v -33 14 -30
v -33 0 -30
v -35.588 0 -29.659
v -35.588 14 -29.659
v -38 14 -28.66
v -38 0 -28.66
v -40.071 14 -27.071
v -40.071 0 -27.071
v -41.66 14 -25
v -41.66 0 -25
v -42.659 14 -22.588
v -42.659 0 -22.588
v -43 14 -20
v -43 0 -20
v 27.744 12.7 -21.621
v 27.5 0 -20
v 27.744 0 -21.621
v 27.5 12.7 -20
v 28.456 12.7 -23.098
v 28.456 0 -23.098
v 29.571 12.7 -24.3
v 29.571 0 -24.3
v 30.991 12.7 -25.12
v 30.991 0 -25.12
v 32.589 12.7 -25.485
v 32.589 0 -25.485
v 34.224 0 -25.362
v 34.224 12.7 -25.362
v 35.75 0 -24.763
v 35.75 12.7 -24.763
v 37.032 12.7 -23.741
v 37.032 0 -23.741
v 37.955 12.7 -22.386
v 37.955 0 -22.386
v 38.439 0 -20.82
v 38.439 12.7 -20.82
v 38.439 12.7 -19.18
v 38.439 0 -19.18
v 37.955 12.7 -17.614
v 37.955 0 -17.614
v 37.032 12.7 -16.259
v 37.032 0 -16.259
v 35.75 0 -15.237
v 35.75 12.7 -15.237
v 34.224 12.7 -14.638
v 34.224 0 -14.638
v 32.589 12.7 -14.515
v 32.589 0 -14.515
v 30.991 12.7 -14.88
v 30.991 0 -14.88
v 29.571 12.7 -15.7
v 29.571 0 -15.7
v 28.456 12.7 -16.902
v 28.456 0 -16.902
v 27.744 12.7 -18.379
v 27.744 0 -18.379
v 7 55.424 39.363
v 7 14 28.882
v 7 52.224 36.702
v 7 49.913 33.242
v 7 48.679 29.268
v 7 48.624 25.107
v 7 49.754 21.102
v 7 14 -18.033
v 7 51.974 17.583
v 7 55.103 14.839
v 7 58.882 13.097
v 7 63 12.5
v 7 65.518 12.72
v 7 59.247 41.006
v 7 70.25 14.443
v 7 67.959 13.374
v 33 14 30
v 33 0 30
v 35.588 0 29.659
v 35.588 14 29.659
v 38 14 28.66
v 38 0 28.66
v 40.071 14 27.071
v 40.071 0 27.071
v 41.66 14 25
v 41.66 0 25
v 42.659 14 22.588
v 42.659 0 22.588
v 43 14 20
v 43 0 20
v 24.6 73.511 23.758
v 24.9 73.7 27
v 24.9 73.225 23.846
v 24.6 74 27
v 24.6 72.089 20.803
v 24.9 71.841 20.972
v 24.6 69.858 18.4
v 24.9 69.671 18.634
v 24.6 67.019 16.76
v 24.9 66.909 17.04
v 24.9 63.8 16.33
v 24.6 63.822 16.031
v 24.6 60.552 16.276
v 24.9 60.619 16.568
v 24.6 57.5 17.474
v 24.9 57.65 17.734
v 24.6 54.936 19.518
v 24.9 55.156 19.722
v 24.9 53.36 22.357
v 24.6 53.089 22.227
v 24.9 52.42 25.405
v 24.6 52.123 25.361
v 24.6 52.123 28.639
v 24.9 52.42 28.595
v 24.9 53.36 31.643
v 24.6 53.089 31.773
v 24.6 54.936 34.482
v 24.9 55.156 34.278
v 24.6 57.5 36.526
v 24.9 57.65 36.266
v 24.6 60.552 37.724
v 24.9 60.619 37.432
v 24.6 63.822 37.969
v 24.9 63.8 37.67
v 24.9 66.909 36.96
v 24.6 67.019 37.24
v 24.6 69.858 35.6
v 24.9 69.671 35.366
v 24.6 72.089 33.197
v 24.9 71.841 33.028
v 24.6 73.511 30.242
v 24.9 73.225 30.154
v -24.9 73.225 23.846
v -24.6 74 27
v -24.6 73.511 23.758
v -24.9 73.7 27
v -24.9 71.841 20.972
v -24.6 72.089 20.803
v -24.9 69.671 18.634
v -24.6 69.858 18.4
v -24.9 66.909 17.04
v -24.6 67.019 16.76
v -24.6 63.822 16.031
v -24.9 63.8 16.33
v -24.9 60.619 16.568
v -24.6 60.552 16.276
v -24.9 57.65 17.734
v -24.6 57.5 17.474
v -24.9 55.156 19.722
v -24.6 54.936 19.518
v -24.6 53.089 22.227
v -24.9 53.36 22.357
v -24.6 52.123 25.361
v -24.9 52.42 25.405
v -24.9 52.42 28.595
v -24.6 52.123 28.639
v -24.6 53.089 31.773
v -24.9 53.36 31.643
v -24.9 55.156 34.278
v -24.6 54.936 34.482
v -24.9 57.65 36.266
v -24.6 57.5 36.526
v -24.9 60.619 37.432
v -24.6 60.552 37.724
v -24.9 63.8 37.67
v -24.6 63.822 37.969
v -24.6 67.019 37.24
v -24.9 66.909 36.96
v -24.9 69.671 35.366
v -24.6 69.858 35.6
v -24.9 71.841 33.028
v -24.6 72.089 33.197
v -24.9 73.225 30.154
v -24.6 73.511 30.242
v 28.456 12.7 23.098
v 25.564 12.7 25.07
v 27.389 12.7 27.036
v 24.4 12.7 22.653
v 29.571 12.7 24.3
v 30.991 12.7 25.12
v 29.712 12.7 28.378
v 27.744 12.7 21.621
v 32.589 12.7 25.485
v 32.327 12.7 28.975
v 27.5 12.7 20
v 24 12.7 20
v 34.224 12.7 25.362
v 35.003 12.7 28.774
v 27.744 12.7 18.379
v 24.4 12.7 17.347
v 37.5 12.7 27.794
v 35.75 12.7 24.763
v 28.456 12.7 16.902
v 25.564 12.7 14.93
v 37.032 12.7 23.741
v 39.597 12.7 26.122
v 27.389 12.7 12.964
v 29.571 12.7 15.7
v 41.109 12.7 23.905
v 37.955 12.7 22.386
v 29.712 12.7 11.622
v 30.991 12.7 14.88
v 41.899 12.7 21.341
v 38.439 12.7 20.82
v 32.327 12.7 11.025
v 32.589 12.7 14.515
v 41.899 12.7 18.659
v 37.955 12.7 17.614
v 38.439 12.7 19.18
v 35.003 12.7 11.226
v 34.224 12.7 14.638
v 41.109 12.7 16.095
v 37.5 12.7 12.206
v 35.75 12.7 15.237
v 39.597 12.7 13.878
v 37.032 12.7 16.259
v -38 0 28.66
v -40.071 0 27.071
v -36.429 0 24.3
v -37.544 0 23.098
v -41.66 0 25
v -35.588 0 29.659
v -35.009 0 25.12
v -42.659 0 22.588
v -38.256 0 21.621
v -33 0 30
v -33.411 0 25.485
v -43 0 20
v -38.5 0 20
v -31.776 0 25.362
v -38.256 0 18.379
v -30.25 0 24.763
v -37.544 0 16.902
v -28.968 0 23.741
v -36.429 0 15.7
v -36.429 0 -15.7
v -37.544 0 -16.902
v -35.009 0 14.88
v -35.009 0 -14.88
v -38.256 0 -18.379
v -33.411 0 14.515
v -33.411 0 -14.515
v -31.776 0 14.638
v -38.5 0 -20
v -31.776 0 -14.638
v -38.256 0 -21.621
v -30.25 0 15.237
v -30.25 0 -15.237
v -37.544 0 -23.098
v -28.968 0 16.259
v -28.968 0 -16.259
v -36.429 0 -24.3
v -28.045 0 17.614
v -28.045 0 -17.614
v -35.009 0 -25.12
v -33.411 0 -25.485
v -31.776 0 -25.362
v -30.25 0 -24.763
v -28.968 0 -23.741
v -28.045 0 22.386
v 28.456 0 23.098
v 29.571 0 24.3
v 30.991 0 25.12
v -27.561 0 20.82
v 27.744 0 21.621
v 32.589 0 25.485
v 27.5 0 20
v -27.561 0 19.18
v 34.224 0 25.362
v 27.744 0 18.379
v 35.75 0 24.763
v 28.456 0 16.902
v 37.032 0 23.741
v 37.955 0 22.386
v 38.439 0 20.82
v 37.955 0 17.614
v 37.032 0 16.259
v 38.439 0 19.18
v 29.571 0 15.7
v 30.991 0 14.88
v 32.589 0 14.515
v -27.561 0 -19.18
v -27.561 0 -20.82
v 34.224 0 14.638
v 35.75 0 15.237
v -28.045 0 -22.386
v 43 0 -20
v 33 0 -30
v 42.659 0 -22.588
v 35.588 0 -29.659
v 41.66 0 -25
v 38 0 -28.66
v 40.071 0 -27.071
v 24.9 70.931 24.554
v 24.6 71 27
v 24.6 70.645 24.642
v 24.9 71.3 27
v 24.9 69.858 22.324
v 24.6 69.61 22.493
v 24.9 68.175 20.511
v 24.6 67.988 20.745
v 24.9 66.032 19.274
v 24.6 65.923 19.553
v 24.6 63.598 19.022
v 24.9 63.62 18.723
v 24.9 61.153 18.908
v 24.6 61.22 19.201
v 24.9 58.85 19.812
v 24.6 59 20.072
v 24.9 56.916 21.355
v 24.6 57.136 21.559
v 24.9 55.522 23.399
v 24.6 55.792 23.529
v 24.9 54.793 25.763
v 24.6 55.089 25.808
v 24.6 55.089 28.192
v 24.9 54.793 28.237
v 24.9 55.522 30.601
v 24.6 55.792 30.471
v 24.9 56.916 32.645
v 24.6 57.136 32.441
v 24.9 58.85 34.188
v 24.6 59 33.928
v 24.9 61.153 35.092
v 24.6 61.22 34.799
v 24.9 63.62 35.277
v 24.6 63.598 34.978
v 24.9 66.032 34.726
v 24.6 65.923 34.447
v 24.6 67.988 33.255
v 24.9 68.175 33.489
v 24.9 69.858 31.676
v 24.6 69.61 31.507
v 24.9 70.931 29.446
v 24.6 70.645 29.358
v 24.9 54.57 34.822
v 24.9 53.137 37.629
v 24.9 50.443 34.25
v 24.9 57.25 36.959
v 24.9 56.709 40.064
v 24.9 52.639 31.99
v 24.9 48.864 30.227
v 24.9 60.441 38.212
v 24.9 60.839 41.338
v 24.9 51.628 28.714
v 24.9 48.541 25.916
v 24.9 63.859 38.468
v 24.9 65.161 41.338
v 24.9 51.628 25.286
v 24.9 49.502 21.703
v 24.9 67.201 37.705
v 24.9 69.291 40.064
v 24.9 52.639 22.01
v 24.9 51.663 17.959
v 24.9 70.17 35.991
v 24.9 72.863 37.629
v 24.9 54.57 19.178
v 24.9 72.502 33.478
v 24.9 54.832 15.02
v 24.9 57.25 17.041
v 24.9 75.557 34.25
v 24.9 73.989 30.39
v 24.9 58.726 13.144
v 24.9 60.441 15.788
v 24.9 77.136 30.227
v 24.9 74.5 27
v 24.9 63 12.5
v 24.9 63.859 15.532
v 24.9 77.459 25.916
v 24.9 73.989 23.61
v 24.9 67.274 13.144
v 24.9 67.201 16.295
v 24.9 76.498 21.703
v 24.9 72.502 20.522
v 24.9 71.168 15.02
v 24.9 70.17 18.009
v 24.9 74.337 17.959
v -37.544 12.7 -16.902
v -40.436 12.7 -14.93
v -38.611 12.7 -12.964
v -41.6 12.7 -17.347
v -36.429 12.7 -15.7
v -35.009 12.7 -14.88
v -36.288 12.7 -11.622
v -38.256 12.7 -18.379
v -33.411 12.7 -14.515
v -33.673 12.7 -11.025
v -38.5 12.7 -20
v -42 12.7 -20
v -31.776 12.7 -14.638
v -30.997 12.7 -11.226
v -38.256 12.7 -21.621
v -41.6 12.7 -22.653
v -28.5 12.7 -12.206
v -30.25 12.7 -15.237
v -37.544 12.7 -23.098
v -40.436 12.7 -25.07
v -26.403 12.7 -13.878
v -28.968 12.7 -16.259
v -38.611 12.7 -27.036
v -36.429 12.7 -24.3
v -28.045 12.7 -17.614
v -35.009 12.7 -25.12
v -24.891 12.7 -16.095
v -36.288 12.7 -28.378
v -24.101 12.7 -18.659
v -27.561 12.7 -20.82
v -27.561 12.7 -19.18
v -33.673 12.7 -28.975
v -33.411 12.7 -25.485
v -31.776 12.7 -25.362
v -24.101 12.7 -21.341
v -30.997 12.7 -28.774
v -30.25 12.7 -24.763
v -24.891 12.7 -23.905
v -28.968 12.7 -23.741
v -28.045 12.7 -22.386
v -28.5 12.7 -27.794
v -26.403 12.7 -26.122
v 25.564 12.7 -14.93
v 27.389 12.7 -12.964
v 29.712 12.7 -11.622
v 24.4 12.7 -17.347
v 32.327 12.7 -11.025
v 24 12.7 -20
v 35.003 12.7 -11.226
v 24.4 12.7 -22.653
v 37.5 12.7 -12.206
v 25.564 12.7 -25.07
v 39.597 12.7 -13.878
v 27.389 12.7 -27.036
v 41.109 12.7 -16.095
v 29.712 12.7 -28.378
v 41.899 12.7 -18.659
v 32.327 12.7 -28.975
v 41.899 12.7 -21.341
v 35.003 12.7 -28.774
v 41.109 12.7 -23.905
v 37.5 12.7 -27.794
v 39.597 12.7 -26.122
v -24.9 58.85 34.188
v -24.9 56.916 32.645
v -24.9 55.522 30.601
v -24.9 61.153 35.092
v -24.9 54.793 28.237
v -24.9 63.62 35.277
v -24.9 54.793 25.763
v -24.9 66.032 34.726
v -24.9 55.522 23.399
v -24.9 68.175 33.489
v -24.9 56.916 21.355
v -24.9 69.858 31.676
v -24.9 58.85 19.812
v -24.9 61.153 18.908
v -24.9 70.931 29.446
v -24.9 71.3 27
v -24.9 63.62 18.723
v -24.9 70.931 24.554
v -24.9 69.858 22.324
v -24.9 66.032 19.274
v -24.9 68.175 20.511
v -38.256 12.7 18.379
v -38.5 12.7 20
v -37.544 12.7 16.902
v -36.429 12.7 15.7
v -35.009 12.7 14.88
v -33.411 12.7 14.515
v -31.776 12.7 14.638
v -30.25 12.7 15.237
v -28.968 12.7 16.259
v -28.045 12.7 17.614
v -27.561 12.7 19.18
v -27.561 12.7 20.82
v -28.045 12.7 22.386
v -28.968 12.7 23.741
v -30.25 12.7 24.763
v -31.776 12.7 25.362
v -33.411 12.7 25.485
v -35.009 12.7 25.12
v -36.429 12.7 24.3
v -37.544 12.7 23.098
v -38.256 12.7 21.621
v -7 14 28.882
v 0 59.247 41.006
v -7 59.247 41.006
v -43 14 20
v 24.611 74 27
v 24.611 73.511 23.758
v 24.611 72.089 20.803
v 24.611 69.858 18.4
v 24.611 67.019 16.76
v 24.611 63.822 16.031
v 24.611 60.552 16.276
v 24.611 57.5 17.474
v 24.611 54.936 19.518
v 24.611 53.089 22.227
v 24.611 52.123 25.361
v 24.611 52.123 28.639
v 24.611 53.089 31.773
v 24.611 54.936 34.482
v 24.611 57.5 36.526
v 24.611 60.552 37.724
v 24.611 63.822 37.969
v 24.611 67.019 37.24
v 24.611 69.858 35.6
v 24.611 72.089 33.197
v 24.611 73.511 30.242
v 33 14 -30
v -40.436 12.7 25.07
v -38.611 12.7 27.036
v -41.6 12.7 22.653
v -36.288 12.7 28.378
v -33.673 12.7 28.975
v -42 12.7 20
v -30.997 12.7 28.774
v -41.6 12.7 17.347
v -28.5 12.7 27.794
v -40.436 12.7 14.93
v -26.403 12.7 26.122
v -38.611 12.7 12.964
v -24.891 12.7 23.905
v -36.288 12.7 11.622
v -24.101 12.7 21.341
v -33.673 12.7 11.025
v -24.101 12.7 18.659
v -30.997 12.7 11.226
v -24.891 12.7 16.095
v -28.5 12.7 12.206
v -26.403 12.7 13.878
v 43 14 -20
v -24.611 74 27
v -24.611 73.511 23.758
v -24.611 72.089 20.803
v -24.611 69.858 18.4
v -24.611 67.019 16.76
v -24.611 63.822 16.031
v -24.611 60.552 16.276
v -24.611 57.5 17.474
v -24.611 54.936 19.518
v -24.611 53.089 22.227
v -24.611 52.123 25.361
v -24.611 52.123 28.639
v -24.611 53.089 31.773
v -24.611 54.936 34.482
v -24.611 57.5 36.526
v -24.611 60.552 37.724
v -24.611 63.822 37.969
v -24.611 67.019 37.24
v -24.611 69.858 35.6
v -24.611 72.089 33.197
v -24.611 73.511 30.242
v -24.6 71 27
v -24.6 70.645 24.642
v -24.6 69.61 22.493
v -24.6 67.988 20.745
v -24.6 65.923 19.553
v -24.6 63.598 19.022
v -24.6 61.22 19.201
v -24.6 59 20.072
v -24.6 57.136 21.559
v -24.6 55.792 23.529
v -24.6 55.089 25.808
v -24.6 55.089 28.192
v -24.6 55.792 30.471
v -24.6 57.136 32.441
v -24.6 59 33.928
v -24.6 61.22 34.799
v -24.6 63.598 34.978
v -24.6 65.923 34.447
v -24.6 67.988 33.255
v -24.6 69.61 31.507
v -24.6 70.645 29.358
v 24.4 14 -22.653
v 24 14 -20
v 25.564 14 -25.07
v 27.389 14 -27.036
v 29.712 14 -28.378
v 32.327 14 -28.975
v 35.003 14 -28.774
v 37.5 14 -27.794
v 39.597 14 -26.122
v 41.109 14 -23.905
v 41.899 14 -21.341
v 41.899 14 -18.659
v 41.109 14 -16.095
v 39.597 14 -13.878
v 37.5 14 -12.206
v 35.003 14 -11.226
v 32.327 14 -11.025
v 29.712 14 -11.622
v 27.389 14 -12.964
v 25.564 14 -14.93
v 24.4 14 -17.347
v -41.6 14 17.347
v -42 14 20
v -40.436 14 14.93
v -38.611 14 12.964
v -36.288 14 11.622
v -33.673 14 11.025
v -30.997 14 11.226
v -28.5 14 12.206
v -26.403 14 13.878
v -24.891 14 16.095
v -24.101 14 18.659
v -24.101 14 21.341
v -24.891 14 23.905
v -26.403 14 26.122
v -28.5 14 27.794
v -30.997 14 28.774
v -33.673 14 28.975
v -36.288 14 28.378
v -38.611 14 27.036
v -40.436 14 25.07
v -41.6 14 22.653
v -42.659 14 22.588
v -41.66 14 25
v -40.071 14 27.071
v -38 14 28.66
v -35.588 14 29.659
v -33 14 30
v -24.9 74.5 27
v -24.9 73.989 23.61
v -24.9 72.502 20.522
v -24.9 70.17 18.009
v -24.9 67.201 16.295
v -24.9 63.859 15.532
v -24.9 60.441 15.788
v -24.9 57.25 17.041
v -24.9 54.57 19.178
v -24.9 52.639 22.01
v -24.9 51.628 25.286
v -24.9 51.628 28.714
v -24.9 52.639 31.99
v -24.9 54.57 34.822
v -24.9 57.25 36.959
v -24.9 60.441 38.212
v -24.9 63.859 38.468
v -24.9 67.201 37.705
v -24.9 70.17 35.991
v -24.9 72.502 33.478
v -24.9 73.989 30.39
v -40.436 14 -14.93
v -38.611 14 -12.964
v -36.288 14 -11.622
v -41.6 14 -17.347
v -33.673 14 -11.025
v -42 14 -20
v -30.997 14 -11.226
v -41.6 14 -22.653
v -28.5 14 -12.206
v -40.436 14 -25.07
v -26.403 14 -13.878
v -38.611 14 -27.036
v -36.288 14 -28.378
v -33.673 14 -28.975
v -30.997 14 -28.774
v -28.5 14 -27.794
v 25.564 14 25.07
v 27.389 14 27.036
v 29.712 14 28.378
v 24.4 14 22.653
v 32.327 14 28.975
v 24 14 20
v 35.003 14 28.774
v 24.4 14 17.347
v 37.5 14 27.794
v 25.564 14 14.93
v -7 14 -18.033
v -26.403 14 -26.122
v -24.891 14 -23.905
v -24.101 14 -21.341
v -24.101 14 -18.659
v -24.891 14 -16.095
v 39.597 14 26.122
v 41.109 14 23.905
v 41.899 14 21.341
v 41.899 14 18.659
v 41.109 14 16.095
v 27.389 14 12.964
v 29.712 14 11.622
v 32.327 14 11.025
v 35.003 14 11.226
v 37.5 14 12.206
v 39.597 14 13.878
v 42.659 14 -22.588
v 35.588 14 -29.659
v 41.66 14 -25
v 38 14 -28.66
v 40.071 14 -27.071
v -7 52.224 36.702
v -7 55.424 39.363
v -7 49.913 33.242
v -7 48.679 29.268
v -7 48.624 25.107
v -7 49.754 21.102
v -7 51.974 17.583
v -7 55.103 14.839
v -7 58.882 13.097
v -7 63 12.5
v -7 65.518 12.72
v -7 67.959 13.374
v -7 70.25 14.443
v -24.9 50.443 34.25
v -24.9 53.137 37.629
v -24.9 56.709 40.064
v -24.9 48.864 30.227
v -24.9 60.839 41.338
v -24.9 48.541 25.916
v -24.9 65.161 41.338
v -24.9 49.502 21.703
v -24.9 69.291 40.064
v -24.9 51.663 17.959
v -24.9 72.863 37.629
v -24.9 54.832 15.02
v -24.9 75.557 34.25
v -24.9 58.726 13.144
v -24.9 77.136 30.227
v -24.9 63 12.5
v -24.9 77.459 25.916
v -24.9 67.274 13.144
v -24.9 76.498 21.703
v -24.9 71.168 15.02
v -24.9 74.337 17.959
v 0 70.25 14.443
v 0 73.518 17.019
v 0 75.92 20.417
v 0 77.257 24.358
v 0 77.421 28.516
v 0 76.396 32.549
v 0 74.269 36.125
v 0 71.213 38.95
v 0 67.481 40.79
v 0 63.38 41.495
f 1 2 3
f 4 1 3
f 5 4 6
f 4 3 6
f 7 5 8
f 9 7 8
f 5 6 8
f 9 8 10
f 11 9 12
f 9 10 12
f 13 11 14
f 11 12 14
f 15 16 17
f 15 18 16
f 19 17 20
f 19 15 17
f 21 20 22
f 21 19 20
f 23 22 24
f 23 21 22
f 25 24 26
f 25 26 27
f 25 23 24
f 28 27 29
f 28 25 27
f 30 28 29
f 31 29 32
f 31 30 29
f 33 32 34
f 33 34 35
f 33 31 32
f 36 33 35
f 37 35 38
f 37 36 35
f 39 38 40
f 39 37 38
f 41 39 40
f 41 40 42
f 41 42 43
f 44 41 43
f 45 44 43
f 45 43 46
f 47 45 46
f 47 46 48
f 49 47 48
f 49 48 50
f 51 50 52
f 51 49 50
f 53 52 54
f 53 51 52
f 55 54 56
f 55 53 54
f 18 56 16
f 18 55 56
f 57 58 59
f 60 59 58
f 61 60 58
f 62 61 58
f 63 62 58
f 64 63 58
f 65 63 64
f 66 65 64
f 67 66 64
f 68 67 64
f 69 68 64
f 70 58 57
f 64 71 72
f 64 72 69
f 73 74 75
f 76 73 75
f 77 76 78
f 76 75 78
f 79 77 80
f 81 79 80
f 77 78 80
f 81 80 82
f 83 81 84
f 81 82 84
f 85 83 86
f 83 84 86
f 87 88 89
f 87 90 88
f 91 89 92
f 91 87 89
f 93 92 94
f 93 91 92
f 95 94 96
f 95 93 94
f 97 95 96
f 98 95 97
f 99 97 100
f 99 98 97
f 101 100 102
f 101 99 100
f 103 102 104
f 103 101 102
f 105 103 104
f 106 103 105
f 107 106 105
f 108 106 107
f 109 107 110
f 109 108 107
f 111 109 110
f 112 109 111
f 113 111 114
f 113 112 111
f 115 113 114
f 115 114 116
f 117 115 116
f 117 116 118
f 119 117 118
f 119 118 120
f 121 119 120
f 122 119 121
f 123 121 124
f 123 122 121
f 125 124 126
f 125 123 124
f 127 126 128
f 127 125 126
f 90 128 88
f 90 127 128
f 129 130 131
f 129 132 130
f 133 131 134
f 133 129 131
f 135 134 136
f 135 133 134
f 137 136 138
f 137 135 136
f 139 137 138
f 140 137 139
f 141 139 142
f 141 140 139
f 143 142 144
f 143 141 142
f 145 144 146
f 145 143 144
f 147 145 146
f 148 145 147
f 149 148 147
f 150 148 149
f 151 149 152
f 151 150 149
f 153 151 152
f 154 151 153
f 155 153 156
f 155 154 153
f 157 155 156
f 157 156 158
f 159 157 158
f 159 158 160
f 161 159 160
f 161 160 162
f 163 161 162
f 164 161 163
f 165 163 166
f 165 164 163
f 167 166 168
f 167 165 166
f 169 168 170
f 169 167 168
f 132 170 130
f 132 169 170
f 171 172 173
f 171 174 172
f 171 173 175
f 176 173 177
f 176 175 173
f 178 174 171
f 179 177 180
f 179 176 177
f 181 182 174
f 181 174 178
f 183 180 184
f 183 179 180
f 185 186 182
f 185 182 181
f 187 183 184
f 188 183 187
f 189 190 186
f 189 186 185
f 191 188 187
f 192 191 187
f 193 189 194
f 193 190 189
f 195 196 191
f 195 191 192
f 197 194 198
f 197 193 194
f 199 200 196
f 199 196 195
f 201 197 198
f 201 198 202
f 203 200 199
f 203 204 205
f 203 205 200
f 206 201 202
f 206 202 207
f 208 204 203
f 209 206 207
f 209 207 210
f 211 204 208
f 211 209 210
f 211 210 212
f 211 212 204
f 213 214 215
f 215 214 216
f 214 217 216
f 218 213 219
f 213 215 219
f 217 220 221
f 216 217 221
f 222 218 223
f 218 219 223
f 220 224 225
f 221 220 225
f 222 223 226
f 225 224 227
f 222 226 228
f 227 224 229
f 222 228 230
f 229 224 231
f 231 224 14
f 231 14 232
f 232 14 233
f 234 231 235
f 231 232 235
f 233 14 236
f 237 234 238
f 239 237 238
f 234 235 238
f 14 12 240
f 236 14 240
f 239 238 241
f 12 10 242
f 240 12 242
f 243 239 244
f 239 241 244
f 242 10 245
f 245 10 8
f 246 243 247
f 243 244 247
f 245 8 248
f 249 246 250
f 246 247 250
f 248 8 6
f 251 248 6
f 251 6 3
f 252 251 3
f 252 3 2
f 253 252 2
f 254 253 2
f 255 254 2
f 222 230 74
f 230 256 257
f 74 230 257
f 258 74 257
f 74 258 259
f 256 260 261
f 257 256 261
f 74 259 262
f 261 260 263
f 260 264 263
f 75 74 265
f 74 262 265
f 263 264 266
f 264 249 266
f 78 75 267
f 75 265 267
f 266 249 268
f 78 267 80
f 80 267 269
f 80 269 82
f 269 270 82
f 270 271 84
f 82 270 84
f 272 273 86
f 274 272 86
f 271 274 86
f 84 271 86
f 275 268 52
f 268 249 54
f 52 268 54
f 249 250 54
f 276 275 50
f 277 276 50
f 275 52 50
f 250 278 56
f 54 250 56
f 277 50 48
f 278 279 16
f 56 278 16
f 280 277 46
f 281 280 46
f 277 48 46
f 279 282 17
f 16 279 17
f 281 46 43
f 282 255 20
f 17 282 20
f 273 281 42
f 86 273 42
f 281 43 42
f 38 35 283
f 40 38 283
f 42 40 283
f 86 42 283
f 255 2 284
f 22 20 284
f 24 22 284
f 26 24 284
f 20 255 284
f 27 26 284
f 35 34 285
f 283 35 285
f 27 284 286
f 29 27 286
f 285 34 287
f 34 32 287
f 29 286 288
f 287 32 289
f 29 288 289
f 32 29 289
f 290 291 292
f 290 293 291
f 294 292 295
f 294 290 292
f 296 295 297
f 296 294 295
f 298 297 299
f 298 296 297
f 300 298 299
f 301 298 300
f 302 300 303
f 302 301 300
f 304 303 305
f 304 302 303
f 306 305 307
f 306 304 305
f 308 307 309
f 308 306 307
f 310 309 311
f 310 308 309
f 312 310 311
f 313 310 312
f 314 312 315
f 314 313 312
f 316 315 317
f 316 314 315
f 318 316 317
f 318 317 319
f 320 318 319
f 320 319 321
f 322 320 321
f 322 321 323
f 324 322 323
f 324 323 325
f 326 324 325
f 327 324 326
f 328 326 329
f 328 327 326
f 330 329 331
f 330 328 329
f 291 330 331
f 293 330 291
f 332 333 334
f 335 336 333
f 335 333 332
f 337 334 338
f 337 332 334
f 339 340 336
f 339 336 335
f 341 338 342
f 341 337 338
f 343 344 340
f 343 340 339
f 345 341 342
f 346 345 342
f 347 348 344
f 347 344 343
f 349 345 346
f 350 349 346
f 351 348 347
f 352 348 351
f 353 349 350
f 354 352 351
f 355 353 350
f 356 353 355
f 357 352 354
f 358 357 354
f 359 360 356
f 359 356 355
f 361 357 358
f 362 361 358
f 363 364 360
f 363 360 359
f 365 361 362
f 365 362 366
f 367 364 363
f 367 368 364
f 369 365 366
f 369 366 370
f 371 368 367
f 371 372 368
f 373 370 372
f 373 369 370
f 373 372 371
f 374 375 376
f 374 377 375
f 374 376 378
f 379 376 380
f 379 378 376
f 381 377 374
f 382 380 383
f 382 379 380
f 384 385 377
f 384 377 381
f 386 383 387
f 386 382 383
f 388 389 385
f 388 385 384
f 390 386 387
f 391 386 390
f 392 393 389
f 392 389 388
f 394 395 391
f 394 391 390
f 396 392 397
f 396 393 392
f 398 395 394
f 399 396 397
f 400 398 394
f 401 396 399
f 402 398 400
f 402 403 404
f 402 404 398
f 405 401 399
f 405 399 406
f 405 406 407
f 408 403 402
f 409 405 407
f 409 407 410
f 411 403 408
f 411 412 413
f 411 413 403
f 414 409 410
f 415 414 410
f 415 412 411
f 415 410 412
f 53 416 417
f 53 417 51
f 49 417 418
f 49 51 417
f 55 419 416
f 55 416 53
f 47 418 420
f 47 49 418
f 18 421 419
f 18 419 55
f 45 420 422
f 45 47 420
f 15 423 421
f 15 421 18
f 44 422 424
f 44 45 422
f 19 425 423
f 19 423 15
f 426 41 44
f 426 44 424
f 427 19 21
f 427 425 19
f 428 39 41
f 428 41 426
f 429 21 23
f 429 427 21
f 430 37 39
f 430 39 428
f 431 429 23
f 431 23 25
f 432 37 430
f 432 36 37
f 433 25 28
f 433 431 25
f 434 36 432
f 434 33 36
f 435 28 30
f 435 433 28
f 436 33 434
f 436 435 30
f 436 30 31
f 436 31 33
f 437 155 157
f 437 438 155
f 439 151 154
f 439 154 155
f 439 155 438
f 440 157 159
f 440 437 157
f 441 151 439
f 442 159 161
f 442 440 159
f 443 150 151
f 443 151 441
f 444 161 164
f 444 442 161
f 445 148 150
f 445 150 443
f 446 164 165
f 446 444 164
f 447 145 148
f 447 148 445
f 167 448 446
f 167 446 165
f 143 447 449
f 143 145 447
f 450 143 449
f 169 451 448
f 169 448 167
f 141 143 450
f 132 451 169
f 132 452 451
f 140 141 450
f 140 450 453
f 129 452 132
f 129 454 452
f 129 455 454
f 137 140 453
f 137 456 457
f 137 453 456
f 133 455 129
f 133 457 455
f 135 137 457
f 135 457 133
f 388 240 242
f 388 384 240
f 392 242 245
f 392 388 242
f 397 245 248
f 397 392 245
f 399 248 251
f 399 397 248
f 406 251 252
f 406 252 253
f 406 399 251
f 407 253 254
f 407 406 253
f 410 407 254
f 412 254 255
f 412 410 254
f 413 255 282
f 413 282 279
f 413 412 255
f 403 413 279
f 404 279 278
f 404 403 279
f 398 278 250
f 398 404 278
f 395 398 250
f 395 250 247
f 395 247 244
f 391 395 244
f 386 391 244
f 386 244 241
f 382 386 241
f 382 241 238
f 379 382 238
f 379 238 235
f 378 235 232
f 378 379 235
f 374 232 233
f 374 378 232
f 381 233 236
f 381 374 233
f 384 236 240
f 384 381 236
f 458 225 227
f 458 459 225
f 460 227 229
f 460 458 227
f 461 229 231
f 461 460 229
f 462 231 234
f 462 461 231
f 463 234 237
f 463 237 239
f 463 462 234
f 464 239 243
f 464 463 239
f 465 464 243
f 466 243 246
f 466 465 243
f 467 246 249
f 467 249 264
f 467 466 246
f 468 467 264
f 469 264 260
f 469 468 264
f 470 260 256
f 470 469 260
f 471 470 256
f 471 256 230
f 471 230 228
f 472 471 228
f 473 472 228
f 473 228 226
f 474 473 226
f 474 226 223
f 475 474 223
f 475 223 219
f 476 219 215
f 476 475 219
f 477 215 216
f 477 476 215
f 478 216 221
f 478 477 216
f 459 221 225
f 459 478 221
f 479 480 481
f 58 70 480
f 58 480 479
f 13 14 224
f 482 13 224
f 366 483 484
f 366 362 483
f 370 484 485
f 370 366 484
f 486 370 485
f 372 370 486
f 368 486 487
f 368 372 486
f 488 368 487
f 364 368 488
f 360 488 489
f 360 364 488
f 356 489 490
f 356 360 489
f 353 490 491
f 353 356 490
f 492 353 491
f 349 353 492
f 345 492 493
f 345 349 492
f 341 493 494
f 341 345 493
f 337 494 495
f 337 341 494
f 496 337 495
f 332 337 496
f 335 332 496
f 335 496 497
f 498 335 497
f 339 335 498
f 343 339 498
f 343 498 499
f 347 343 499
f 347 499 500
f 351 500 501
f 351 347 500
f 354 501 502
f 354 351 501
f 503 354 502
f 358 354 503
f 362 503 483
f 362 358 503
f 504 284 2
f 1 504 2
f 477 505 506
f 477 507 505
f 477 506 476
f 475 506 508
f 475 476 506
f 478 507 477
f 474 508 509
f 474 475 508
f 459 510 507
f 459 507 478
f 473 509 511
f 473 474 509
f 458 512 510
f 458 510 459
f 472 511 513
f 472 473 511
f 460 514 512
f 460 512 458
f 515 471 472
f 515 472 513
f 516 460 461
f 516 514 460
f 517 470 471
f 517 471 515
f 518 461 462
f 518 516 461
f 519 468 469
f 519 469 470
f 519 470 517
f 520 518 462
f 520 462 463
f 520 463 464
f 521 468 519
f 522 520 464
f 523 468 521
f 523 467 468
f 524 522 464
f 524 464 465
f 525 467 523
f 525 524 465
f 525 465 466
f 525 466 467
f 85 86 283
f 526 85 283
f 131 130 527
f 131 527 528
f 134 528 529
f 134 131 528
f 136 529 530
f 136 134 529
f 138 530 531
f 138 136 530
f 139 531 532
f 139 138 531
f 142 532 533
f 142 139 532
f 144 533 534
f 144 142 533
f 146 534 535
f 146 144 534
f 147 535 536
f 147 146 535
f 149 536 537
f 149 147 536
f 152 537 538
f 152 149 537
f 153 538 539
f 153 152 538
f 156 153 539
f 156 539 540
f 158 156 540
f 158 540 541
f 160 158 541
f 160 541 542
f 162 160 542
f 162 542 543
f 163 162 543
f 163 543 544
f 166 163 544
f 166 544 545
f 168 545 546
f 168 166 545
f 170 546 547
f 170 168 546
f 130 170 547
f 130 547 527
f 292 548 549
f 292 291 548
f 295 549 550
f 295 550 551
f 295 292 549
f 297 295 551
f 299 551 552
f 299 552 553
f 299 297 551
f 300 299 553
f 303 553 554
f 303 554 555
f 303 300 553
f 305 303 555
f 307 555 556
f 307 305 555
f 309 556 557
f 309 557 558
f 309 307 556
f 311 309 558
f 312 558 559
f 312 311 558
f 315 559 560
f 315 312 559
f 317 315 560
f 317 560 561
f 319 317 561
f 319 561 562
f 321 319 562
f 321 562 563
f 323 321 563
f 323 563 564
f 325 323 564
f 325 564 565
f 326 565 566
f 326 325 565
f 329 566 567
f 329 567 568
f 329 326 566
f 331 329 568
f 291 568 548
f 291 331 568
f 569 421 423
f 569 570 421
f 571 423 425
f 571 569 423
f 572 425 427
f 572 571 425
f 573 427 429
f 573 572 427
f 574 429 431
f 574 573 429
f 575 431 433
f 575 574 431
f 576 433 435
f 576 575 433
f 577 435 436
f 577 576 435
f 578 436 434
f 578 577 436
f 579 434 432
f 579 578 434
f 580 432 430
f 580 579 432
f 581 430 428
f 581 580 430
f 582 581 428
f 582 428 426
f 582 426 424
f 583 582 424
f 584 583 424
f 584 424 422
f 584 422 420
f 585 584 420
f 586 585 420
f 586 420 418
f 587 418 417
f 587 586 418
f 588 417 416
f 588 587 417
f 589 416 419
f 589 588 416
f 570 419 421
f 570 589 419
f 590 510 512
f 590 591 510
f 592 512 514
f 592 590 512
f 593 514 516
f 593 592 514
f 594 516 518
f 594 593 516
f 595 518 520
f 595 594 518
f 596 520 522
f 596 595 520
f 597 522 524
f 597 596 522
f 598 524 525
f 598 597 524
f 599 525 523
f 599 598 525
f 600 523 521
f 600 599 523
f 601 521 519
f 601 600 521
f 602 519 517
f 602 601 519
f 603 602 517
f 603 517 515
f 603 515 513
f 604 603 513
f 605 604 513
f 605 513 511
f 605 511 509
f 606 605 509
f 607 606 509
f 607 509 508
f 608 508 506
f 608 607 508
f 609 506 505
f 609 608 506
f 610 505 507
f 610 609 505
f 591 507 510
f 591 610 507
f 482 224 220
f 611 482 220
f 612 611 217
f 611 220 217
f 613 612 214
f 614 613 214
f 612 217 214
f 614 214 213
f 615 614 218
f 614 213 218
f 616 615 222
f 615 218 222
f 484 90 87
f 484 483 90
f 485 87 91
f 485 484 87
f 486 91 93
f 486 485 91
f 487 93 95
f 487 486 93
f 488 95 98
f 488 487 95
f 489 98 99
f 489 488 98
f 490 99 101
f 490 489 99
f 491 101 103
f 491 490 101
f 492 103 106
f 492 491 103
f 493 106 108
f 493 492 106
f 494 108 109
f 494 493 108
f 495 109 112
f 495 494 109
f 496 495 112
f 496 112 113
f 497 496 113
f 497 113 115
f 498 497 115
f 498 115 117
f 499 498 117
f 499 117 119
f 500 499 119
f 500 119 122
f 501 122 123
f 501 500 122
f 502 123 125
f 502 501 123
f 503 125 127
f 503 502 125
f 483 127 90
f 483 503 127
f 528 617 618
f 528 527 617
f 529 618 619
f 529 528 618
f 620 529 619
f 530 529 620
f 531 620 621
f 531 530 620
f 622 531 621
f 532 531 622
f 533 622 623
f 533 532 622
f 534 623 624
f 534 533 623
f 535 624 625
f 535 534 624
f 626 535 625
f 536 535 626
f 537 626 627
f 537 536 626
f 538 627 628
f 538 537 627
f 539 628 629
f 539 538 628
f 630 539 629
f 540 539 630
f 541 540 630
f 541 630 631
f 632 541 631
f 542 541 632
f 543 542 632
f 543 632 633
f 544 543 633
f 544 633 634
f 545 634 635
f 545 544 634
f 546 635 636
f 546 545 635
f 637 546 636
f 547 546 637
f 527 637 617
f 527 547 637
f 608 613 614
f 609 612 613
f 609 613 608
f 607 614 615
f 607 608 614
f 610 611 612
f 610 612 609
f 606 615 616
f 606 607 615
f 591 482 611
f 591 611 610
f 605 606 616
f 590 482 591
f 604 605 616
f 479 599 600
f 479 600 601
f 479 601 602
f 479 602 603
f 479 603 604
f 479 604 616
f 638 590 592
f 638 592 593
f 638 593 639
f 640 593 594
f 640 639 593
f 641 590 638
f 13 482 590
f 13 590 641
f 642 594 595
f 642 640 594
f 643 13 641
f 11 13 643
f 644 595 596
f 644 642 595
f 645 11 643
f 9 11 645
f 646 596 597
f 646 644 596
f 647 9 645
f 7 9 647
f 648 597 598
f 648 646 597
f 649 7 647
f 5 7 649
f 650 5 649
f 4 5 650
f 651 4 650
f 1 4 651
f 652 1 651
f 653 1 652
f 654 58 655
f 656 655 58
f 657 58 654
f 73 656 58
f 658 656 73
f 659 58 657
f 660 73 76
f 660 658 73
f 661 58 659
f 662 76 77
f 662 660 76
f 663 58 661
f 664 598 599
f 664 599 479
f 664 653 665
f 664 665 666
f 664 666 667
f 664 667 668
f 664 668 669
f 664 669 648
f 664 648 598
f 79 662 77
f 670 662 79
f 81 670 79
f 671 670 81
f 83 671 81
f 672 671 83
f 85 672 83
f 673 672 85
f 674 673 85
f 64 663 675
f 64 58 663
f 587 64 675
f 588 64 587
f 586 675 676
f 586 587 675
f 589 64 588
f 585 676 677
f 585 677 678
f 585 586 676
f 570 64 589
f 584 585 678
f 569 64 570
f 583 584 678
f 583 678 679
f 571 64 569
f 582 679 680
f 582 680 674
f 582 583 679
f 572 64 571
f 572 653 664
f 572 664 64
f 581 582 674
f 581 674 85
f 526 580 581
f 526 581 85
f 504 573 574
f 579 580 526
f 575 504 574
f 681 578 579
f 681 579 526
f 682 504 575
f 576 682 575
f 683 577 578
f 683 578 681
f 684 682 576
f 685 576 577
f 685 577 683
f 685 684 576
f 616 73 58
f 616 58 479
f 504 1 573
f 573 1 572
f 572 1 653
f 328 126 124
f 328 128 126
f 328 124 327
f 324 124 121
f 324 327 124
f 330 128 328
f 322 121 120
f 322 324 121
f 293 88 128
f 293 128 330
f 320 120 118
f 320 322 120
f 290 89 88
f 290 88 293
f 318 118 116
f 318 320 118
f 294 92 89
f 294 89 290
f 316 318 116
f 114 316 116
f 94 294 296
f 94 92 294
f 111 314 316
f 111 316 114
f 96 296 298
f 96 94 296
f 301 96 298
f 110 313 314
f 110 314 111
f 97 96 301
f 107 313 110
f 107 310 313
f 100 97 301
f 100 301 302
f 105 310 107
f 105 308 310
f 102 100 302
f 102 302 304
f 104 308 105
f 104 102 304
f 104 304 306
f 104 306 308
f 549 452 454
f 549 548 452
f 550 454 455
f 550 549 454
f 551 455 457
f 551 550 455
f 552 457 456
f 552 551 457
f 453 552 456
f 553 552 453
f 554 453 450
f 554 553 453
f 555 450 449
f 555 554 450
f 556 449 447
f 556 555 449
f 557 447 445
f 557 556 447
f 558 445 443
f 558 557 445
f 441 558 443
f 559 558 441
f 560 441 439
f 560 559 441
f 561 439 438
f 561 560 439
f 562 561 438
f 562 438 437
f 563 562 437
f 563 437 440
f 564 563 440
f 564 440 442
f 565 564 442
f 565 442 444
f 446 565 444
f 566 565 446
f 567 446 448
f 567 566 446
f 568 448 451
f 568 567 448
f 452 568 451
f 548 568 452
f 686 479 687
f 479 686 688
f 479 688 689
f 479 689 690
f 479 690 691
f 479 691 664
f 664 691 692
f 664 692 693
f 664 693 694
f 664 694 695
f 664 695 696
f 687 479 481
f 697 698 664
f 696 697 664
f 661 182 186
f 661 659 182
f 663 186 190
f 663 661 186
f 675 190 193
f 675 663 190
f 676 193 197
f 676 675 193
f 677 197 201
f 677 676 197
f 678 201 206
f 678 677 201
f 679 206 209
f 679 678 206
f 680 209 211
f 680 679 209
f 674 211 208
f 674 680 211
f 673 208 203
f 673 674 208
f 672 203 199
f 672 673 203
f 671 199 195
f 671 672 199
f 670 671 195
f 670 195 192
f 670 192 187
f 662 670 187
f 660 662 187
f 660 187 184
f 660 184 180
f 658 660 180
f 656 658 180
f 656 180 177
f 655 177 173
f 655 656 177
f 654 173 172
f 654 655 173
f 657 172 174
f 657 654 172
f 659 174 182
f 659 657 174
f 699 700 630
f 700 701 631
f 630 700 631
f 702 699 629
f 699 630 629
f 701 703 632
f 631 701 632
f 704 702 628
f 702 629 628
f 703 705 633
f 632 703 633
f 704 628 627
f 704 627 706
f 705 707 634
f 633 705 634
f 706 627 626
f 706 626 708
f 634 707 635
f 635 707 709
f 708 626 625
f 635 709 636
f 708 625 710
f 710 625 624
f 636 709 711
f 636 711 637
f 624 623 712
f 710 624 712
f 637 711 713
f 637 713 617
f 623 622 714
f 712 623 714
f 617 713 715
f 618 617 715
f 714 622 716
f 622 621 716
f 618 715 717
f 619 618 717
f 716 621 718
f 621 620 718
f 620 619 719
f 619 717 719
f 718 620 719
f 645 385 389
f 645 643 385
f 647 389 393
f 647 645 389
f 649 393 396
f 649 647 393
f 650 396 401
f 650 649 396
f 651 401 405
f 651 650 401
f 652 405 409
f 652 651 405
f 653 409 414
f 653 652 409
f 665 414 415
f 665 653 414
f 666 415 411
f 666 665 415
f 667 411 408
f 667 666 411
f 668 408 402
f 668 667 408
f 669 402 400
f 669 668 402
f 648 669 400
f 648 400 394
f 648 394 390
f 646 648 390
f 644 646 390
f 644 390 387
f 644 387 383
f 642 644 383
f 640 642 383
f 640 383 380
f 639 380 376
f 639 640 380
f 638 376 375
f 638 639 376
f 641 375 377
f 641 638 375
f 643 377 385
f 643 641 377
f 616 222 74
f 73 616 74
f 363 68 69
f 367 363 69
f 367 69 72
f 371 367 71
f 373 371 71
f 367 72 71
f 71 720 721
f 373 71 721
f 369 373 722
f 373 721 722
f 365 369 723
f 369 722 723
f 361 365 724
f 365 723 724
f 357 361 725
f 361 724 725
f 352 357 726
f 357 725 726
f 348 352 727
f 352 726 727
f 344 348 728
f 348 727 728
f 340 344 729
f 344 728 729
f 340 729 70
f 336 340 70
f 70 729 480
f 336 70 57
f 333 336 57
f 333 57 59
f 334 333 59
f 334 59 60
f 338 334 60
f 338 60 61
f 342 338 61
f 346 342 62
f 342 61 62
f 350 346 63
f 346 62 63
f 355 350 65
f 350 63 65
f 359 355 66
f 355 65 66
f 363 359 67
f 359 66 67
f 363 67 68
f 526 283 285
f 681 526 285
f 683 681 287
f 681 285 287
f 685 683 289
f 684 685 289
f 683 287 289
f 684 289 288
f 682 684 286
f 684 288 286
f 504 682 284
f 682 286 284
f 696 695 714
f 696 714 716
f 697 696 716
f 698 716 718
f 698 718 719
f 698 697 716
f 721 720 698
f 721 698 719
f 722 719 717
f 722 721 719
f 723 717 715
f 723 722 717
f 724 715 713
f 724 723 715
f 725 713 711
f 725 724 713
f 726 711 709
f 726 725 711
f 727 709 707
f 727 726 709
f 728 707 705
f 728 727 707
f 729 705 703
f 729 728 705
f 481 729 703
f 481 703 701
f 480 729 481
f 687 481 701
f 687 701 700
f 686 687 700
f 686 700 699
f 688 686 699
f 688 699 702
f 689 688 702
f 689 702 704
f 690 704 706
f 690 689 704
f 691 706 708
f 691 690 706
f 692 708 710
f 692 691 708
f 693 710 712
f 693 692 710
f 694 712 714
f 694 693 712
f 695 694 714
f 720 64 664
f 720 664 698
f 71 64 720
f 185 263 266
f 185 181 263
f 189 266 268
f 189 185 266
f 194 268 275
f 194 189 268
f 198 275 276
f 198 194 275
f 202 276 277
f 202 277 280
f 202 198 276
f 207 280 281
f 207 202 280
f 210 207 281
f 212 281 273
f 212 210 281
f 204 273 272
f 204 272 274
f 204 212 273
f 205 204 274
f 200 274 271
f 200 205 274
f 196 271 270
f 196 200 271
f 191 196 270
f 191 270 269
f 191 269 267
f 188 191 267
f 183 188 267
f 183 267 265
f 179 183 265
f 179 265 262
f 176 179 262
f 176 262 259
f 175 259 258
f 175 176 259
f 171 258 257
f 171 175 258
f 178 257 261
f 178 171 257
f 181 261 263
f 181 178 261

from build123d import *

# Parameters (mm, degrees)
BOSS_EXTRUDE1_DEPTH      = 14
BOSS_EXTRUDE2_DEPTH      = 7
BOSS_EXTRUDE2_DEPTH_BACK = 7
SKETCH3_R                = 14.5
BOSS_EXTRUDE3_DEPTH      = 24.9
BOSS_EXTRUDE3_DEPTH_BACK = 24.9


with BuildPart() as part:
    # Sketch1 → Boss-Extrude1 (new body)
    with BuildSketch(Plane(origin=(0, 0, 0), x_dir=(1, 0, 0), z_dir=(0, 1, 0))):
        with BuildLine():
            Line((-33, -30), (33, -30))
            ThreePointArc((33, -30), (40.071067812, -27.071067812), (43, -20))
            Line((43, -20), (43, 20))
            ThreePointArc((43, 20), (40.071067812, 27.071067812), (33, 30))
            Line((33, 30), (-33, 30))
            ThreePointArc((-33, 30), (-40.071067812, 27.071067812), (-43, 20))
            Line((-43, 20), (-43, -20))
            ThreePointArc((-43, -20), (-40.071067812, -27.071067812), (-33, -30))
        make_face()
    extrude(amount=BOSS_EXTRUDE1_DEPTH)

    # Sketch2 → Boss-Extrude2 (add, two sides)
    with BuildSketch(Plane(origin=(0, 0, 0), x_dir=(0, 0, -1), z_dir=(1, 0, 0))) as boss_extrude2_sk:
        Polygon((-41.005924481, 59.247123846), (-28.881994187, 14), (18.033320997, 14), (-14.442631645, 70.25), align=None)
    extrude(amount=BOSS_EXTRUDE2_DEPTH)
    extrude(boss_extrude2_sk.sketch, amount=-BOSS_EXTRUDE2_DEPTH_BACK)

    # Sketch3 → Boss-Extrude3 (add, two sides)
    with BuildSketch(Plane(origin=(0, 0, 0), x_dir=(0, 0, -1), z_dir=(1, 0, 0))) as boss_extrude3_sk:
        with Locations((-27, 63)):
            Circle(SKETCH3_R)
    extrude(amount=BOSS_EXTRUDE3_DEPTH)
    extrude(boss_extrude3_sk.sketch, amount=-BOSS_EXTRUDE3_DEPTH_BACK)

    # Sketch4 → Cut-Revolve1 (revolve, cut)
    with BuildSketch(Plane.XY.offset(20)):
        Polygon((-33, 0), (-38.5, 0), (-38.5, 12.7), (-42, 12.7), (-42, 14), (-33, 14), align=None)
    revolve(axis=Axis((-33, 14, 20), (0, -1, 0)), mode=Mode.SUBTRACT)

    # Sketch5 → Cut-Revolve2 (revolve, cut)
    with BuildSketch(Plane.XY.offset(-20)):
        Polygon((-33, 0), (-38.5, 0), (-38.5, 12.7), (-42, 12.7), (-42, 14), (-33, 14), align=None)
    revolve(axis=Axis((-33, 14, -20), (0, -1, 0)), mode=Mode.SUBTRACT)

    # Sketch6 → Cut-Revolve3 (revolve, cut)
    with BuildSketch(Plane.XY.offset(20)):
        Polygon((33, 0), (27.5, 0), (27.5, 12.7), (24, 12.7), (24, 14), (33, 14), align=None)
    revolve(axis=Axis((33, 14, 20), (0, -1, 0)), mode=Mode.SUBTRACT)

    # Sketch7 → Cut-Revolve4 (revolve, cut)
    with BuildSketch(Plane.XY.offset(-20)):
        Polygon((33, 0), (27.5, 0), (27.5, 12.7), (24, 12.7), (24, 14), (33, 14), align=None)
    revolve(axis=Axis((33, 14, -20), (0, -1, 0)), mode=Mode.SUBTRACT)

    # Sketch8 → Cut-Revolve5 (revolve, cut)
    with BuildSketch(Plane.XY.offset(27)):
        Polygon((-24.9, 63), (-24.9, 74.5), (-24.611324865, 74), (24.611324865, 74), (24.9, 74.5), (24.9, 63), align=None)
    revolve(axis=Axis((24.9, 63, 27), (-1, 0, 0)), mode=Mode.SUBTRACT)

    # Sketch9 → Revolve1 (revolve)
    with BuildSketch(Plane.XY.offset(27)):
        Polygon((-24.9, 71.3), (-24.6, 71), (24.6, 71), (24.9, 71.3), (24.9, 73.7), (24.6, 74), (-24.6, 74), (-24.9, 73.7), align=None)
    revolve(axis=Axis((24.9, 63, 27), (-1, 0, 0)))


solid = part.part
